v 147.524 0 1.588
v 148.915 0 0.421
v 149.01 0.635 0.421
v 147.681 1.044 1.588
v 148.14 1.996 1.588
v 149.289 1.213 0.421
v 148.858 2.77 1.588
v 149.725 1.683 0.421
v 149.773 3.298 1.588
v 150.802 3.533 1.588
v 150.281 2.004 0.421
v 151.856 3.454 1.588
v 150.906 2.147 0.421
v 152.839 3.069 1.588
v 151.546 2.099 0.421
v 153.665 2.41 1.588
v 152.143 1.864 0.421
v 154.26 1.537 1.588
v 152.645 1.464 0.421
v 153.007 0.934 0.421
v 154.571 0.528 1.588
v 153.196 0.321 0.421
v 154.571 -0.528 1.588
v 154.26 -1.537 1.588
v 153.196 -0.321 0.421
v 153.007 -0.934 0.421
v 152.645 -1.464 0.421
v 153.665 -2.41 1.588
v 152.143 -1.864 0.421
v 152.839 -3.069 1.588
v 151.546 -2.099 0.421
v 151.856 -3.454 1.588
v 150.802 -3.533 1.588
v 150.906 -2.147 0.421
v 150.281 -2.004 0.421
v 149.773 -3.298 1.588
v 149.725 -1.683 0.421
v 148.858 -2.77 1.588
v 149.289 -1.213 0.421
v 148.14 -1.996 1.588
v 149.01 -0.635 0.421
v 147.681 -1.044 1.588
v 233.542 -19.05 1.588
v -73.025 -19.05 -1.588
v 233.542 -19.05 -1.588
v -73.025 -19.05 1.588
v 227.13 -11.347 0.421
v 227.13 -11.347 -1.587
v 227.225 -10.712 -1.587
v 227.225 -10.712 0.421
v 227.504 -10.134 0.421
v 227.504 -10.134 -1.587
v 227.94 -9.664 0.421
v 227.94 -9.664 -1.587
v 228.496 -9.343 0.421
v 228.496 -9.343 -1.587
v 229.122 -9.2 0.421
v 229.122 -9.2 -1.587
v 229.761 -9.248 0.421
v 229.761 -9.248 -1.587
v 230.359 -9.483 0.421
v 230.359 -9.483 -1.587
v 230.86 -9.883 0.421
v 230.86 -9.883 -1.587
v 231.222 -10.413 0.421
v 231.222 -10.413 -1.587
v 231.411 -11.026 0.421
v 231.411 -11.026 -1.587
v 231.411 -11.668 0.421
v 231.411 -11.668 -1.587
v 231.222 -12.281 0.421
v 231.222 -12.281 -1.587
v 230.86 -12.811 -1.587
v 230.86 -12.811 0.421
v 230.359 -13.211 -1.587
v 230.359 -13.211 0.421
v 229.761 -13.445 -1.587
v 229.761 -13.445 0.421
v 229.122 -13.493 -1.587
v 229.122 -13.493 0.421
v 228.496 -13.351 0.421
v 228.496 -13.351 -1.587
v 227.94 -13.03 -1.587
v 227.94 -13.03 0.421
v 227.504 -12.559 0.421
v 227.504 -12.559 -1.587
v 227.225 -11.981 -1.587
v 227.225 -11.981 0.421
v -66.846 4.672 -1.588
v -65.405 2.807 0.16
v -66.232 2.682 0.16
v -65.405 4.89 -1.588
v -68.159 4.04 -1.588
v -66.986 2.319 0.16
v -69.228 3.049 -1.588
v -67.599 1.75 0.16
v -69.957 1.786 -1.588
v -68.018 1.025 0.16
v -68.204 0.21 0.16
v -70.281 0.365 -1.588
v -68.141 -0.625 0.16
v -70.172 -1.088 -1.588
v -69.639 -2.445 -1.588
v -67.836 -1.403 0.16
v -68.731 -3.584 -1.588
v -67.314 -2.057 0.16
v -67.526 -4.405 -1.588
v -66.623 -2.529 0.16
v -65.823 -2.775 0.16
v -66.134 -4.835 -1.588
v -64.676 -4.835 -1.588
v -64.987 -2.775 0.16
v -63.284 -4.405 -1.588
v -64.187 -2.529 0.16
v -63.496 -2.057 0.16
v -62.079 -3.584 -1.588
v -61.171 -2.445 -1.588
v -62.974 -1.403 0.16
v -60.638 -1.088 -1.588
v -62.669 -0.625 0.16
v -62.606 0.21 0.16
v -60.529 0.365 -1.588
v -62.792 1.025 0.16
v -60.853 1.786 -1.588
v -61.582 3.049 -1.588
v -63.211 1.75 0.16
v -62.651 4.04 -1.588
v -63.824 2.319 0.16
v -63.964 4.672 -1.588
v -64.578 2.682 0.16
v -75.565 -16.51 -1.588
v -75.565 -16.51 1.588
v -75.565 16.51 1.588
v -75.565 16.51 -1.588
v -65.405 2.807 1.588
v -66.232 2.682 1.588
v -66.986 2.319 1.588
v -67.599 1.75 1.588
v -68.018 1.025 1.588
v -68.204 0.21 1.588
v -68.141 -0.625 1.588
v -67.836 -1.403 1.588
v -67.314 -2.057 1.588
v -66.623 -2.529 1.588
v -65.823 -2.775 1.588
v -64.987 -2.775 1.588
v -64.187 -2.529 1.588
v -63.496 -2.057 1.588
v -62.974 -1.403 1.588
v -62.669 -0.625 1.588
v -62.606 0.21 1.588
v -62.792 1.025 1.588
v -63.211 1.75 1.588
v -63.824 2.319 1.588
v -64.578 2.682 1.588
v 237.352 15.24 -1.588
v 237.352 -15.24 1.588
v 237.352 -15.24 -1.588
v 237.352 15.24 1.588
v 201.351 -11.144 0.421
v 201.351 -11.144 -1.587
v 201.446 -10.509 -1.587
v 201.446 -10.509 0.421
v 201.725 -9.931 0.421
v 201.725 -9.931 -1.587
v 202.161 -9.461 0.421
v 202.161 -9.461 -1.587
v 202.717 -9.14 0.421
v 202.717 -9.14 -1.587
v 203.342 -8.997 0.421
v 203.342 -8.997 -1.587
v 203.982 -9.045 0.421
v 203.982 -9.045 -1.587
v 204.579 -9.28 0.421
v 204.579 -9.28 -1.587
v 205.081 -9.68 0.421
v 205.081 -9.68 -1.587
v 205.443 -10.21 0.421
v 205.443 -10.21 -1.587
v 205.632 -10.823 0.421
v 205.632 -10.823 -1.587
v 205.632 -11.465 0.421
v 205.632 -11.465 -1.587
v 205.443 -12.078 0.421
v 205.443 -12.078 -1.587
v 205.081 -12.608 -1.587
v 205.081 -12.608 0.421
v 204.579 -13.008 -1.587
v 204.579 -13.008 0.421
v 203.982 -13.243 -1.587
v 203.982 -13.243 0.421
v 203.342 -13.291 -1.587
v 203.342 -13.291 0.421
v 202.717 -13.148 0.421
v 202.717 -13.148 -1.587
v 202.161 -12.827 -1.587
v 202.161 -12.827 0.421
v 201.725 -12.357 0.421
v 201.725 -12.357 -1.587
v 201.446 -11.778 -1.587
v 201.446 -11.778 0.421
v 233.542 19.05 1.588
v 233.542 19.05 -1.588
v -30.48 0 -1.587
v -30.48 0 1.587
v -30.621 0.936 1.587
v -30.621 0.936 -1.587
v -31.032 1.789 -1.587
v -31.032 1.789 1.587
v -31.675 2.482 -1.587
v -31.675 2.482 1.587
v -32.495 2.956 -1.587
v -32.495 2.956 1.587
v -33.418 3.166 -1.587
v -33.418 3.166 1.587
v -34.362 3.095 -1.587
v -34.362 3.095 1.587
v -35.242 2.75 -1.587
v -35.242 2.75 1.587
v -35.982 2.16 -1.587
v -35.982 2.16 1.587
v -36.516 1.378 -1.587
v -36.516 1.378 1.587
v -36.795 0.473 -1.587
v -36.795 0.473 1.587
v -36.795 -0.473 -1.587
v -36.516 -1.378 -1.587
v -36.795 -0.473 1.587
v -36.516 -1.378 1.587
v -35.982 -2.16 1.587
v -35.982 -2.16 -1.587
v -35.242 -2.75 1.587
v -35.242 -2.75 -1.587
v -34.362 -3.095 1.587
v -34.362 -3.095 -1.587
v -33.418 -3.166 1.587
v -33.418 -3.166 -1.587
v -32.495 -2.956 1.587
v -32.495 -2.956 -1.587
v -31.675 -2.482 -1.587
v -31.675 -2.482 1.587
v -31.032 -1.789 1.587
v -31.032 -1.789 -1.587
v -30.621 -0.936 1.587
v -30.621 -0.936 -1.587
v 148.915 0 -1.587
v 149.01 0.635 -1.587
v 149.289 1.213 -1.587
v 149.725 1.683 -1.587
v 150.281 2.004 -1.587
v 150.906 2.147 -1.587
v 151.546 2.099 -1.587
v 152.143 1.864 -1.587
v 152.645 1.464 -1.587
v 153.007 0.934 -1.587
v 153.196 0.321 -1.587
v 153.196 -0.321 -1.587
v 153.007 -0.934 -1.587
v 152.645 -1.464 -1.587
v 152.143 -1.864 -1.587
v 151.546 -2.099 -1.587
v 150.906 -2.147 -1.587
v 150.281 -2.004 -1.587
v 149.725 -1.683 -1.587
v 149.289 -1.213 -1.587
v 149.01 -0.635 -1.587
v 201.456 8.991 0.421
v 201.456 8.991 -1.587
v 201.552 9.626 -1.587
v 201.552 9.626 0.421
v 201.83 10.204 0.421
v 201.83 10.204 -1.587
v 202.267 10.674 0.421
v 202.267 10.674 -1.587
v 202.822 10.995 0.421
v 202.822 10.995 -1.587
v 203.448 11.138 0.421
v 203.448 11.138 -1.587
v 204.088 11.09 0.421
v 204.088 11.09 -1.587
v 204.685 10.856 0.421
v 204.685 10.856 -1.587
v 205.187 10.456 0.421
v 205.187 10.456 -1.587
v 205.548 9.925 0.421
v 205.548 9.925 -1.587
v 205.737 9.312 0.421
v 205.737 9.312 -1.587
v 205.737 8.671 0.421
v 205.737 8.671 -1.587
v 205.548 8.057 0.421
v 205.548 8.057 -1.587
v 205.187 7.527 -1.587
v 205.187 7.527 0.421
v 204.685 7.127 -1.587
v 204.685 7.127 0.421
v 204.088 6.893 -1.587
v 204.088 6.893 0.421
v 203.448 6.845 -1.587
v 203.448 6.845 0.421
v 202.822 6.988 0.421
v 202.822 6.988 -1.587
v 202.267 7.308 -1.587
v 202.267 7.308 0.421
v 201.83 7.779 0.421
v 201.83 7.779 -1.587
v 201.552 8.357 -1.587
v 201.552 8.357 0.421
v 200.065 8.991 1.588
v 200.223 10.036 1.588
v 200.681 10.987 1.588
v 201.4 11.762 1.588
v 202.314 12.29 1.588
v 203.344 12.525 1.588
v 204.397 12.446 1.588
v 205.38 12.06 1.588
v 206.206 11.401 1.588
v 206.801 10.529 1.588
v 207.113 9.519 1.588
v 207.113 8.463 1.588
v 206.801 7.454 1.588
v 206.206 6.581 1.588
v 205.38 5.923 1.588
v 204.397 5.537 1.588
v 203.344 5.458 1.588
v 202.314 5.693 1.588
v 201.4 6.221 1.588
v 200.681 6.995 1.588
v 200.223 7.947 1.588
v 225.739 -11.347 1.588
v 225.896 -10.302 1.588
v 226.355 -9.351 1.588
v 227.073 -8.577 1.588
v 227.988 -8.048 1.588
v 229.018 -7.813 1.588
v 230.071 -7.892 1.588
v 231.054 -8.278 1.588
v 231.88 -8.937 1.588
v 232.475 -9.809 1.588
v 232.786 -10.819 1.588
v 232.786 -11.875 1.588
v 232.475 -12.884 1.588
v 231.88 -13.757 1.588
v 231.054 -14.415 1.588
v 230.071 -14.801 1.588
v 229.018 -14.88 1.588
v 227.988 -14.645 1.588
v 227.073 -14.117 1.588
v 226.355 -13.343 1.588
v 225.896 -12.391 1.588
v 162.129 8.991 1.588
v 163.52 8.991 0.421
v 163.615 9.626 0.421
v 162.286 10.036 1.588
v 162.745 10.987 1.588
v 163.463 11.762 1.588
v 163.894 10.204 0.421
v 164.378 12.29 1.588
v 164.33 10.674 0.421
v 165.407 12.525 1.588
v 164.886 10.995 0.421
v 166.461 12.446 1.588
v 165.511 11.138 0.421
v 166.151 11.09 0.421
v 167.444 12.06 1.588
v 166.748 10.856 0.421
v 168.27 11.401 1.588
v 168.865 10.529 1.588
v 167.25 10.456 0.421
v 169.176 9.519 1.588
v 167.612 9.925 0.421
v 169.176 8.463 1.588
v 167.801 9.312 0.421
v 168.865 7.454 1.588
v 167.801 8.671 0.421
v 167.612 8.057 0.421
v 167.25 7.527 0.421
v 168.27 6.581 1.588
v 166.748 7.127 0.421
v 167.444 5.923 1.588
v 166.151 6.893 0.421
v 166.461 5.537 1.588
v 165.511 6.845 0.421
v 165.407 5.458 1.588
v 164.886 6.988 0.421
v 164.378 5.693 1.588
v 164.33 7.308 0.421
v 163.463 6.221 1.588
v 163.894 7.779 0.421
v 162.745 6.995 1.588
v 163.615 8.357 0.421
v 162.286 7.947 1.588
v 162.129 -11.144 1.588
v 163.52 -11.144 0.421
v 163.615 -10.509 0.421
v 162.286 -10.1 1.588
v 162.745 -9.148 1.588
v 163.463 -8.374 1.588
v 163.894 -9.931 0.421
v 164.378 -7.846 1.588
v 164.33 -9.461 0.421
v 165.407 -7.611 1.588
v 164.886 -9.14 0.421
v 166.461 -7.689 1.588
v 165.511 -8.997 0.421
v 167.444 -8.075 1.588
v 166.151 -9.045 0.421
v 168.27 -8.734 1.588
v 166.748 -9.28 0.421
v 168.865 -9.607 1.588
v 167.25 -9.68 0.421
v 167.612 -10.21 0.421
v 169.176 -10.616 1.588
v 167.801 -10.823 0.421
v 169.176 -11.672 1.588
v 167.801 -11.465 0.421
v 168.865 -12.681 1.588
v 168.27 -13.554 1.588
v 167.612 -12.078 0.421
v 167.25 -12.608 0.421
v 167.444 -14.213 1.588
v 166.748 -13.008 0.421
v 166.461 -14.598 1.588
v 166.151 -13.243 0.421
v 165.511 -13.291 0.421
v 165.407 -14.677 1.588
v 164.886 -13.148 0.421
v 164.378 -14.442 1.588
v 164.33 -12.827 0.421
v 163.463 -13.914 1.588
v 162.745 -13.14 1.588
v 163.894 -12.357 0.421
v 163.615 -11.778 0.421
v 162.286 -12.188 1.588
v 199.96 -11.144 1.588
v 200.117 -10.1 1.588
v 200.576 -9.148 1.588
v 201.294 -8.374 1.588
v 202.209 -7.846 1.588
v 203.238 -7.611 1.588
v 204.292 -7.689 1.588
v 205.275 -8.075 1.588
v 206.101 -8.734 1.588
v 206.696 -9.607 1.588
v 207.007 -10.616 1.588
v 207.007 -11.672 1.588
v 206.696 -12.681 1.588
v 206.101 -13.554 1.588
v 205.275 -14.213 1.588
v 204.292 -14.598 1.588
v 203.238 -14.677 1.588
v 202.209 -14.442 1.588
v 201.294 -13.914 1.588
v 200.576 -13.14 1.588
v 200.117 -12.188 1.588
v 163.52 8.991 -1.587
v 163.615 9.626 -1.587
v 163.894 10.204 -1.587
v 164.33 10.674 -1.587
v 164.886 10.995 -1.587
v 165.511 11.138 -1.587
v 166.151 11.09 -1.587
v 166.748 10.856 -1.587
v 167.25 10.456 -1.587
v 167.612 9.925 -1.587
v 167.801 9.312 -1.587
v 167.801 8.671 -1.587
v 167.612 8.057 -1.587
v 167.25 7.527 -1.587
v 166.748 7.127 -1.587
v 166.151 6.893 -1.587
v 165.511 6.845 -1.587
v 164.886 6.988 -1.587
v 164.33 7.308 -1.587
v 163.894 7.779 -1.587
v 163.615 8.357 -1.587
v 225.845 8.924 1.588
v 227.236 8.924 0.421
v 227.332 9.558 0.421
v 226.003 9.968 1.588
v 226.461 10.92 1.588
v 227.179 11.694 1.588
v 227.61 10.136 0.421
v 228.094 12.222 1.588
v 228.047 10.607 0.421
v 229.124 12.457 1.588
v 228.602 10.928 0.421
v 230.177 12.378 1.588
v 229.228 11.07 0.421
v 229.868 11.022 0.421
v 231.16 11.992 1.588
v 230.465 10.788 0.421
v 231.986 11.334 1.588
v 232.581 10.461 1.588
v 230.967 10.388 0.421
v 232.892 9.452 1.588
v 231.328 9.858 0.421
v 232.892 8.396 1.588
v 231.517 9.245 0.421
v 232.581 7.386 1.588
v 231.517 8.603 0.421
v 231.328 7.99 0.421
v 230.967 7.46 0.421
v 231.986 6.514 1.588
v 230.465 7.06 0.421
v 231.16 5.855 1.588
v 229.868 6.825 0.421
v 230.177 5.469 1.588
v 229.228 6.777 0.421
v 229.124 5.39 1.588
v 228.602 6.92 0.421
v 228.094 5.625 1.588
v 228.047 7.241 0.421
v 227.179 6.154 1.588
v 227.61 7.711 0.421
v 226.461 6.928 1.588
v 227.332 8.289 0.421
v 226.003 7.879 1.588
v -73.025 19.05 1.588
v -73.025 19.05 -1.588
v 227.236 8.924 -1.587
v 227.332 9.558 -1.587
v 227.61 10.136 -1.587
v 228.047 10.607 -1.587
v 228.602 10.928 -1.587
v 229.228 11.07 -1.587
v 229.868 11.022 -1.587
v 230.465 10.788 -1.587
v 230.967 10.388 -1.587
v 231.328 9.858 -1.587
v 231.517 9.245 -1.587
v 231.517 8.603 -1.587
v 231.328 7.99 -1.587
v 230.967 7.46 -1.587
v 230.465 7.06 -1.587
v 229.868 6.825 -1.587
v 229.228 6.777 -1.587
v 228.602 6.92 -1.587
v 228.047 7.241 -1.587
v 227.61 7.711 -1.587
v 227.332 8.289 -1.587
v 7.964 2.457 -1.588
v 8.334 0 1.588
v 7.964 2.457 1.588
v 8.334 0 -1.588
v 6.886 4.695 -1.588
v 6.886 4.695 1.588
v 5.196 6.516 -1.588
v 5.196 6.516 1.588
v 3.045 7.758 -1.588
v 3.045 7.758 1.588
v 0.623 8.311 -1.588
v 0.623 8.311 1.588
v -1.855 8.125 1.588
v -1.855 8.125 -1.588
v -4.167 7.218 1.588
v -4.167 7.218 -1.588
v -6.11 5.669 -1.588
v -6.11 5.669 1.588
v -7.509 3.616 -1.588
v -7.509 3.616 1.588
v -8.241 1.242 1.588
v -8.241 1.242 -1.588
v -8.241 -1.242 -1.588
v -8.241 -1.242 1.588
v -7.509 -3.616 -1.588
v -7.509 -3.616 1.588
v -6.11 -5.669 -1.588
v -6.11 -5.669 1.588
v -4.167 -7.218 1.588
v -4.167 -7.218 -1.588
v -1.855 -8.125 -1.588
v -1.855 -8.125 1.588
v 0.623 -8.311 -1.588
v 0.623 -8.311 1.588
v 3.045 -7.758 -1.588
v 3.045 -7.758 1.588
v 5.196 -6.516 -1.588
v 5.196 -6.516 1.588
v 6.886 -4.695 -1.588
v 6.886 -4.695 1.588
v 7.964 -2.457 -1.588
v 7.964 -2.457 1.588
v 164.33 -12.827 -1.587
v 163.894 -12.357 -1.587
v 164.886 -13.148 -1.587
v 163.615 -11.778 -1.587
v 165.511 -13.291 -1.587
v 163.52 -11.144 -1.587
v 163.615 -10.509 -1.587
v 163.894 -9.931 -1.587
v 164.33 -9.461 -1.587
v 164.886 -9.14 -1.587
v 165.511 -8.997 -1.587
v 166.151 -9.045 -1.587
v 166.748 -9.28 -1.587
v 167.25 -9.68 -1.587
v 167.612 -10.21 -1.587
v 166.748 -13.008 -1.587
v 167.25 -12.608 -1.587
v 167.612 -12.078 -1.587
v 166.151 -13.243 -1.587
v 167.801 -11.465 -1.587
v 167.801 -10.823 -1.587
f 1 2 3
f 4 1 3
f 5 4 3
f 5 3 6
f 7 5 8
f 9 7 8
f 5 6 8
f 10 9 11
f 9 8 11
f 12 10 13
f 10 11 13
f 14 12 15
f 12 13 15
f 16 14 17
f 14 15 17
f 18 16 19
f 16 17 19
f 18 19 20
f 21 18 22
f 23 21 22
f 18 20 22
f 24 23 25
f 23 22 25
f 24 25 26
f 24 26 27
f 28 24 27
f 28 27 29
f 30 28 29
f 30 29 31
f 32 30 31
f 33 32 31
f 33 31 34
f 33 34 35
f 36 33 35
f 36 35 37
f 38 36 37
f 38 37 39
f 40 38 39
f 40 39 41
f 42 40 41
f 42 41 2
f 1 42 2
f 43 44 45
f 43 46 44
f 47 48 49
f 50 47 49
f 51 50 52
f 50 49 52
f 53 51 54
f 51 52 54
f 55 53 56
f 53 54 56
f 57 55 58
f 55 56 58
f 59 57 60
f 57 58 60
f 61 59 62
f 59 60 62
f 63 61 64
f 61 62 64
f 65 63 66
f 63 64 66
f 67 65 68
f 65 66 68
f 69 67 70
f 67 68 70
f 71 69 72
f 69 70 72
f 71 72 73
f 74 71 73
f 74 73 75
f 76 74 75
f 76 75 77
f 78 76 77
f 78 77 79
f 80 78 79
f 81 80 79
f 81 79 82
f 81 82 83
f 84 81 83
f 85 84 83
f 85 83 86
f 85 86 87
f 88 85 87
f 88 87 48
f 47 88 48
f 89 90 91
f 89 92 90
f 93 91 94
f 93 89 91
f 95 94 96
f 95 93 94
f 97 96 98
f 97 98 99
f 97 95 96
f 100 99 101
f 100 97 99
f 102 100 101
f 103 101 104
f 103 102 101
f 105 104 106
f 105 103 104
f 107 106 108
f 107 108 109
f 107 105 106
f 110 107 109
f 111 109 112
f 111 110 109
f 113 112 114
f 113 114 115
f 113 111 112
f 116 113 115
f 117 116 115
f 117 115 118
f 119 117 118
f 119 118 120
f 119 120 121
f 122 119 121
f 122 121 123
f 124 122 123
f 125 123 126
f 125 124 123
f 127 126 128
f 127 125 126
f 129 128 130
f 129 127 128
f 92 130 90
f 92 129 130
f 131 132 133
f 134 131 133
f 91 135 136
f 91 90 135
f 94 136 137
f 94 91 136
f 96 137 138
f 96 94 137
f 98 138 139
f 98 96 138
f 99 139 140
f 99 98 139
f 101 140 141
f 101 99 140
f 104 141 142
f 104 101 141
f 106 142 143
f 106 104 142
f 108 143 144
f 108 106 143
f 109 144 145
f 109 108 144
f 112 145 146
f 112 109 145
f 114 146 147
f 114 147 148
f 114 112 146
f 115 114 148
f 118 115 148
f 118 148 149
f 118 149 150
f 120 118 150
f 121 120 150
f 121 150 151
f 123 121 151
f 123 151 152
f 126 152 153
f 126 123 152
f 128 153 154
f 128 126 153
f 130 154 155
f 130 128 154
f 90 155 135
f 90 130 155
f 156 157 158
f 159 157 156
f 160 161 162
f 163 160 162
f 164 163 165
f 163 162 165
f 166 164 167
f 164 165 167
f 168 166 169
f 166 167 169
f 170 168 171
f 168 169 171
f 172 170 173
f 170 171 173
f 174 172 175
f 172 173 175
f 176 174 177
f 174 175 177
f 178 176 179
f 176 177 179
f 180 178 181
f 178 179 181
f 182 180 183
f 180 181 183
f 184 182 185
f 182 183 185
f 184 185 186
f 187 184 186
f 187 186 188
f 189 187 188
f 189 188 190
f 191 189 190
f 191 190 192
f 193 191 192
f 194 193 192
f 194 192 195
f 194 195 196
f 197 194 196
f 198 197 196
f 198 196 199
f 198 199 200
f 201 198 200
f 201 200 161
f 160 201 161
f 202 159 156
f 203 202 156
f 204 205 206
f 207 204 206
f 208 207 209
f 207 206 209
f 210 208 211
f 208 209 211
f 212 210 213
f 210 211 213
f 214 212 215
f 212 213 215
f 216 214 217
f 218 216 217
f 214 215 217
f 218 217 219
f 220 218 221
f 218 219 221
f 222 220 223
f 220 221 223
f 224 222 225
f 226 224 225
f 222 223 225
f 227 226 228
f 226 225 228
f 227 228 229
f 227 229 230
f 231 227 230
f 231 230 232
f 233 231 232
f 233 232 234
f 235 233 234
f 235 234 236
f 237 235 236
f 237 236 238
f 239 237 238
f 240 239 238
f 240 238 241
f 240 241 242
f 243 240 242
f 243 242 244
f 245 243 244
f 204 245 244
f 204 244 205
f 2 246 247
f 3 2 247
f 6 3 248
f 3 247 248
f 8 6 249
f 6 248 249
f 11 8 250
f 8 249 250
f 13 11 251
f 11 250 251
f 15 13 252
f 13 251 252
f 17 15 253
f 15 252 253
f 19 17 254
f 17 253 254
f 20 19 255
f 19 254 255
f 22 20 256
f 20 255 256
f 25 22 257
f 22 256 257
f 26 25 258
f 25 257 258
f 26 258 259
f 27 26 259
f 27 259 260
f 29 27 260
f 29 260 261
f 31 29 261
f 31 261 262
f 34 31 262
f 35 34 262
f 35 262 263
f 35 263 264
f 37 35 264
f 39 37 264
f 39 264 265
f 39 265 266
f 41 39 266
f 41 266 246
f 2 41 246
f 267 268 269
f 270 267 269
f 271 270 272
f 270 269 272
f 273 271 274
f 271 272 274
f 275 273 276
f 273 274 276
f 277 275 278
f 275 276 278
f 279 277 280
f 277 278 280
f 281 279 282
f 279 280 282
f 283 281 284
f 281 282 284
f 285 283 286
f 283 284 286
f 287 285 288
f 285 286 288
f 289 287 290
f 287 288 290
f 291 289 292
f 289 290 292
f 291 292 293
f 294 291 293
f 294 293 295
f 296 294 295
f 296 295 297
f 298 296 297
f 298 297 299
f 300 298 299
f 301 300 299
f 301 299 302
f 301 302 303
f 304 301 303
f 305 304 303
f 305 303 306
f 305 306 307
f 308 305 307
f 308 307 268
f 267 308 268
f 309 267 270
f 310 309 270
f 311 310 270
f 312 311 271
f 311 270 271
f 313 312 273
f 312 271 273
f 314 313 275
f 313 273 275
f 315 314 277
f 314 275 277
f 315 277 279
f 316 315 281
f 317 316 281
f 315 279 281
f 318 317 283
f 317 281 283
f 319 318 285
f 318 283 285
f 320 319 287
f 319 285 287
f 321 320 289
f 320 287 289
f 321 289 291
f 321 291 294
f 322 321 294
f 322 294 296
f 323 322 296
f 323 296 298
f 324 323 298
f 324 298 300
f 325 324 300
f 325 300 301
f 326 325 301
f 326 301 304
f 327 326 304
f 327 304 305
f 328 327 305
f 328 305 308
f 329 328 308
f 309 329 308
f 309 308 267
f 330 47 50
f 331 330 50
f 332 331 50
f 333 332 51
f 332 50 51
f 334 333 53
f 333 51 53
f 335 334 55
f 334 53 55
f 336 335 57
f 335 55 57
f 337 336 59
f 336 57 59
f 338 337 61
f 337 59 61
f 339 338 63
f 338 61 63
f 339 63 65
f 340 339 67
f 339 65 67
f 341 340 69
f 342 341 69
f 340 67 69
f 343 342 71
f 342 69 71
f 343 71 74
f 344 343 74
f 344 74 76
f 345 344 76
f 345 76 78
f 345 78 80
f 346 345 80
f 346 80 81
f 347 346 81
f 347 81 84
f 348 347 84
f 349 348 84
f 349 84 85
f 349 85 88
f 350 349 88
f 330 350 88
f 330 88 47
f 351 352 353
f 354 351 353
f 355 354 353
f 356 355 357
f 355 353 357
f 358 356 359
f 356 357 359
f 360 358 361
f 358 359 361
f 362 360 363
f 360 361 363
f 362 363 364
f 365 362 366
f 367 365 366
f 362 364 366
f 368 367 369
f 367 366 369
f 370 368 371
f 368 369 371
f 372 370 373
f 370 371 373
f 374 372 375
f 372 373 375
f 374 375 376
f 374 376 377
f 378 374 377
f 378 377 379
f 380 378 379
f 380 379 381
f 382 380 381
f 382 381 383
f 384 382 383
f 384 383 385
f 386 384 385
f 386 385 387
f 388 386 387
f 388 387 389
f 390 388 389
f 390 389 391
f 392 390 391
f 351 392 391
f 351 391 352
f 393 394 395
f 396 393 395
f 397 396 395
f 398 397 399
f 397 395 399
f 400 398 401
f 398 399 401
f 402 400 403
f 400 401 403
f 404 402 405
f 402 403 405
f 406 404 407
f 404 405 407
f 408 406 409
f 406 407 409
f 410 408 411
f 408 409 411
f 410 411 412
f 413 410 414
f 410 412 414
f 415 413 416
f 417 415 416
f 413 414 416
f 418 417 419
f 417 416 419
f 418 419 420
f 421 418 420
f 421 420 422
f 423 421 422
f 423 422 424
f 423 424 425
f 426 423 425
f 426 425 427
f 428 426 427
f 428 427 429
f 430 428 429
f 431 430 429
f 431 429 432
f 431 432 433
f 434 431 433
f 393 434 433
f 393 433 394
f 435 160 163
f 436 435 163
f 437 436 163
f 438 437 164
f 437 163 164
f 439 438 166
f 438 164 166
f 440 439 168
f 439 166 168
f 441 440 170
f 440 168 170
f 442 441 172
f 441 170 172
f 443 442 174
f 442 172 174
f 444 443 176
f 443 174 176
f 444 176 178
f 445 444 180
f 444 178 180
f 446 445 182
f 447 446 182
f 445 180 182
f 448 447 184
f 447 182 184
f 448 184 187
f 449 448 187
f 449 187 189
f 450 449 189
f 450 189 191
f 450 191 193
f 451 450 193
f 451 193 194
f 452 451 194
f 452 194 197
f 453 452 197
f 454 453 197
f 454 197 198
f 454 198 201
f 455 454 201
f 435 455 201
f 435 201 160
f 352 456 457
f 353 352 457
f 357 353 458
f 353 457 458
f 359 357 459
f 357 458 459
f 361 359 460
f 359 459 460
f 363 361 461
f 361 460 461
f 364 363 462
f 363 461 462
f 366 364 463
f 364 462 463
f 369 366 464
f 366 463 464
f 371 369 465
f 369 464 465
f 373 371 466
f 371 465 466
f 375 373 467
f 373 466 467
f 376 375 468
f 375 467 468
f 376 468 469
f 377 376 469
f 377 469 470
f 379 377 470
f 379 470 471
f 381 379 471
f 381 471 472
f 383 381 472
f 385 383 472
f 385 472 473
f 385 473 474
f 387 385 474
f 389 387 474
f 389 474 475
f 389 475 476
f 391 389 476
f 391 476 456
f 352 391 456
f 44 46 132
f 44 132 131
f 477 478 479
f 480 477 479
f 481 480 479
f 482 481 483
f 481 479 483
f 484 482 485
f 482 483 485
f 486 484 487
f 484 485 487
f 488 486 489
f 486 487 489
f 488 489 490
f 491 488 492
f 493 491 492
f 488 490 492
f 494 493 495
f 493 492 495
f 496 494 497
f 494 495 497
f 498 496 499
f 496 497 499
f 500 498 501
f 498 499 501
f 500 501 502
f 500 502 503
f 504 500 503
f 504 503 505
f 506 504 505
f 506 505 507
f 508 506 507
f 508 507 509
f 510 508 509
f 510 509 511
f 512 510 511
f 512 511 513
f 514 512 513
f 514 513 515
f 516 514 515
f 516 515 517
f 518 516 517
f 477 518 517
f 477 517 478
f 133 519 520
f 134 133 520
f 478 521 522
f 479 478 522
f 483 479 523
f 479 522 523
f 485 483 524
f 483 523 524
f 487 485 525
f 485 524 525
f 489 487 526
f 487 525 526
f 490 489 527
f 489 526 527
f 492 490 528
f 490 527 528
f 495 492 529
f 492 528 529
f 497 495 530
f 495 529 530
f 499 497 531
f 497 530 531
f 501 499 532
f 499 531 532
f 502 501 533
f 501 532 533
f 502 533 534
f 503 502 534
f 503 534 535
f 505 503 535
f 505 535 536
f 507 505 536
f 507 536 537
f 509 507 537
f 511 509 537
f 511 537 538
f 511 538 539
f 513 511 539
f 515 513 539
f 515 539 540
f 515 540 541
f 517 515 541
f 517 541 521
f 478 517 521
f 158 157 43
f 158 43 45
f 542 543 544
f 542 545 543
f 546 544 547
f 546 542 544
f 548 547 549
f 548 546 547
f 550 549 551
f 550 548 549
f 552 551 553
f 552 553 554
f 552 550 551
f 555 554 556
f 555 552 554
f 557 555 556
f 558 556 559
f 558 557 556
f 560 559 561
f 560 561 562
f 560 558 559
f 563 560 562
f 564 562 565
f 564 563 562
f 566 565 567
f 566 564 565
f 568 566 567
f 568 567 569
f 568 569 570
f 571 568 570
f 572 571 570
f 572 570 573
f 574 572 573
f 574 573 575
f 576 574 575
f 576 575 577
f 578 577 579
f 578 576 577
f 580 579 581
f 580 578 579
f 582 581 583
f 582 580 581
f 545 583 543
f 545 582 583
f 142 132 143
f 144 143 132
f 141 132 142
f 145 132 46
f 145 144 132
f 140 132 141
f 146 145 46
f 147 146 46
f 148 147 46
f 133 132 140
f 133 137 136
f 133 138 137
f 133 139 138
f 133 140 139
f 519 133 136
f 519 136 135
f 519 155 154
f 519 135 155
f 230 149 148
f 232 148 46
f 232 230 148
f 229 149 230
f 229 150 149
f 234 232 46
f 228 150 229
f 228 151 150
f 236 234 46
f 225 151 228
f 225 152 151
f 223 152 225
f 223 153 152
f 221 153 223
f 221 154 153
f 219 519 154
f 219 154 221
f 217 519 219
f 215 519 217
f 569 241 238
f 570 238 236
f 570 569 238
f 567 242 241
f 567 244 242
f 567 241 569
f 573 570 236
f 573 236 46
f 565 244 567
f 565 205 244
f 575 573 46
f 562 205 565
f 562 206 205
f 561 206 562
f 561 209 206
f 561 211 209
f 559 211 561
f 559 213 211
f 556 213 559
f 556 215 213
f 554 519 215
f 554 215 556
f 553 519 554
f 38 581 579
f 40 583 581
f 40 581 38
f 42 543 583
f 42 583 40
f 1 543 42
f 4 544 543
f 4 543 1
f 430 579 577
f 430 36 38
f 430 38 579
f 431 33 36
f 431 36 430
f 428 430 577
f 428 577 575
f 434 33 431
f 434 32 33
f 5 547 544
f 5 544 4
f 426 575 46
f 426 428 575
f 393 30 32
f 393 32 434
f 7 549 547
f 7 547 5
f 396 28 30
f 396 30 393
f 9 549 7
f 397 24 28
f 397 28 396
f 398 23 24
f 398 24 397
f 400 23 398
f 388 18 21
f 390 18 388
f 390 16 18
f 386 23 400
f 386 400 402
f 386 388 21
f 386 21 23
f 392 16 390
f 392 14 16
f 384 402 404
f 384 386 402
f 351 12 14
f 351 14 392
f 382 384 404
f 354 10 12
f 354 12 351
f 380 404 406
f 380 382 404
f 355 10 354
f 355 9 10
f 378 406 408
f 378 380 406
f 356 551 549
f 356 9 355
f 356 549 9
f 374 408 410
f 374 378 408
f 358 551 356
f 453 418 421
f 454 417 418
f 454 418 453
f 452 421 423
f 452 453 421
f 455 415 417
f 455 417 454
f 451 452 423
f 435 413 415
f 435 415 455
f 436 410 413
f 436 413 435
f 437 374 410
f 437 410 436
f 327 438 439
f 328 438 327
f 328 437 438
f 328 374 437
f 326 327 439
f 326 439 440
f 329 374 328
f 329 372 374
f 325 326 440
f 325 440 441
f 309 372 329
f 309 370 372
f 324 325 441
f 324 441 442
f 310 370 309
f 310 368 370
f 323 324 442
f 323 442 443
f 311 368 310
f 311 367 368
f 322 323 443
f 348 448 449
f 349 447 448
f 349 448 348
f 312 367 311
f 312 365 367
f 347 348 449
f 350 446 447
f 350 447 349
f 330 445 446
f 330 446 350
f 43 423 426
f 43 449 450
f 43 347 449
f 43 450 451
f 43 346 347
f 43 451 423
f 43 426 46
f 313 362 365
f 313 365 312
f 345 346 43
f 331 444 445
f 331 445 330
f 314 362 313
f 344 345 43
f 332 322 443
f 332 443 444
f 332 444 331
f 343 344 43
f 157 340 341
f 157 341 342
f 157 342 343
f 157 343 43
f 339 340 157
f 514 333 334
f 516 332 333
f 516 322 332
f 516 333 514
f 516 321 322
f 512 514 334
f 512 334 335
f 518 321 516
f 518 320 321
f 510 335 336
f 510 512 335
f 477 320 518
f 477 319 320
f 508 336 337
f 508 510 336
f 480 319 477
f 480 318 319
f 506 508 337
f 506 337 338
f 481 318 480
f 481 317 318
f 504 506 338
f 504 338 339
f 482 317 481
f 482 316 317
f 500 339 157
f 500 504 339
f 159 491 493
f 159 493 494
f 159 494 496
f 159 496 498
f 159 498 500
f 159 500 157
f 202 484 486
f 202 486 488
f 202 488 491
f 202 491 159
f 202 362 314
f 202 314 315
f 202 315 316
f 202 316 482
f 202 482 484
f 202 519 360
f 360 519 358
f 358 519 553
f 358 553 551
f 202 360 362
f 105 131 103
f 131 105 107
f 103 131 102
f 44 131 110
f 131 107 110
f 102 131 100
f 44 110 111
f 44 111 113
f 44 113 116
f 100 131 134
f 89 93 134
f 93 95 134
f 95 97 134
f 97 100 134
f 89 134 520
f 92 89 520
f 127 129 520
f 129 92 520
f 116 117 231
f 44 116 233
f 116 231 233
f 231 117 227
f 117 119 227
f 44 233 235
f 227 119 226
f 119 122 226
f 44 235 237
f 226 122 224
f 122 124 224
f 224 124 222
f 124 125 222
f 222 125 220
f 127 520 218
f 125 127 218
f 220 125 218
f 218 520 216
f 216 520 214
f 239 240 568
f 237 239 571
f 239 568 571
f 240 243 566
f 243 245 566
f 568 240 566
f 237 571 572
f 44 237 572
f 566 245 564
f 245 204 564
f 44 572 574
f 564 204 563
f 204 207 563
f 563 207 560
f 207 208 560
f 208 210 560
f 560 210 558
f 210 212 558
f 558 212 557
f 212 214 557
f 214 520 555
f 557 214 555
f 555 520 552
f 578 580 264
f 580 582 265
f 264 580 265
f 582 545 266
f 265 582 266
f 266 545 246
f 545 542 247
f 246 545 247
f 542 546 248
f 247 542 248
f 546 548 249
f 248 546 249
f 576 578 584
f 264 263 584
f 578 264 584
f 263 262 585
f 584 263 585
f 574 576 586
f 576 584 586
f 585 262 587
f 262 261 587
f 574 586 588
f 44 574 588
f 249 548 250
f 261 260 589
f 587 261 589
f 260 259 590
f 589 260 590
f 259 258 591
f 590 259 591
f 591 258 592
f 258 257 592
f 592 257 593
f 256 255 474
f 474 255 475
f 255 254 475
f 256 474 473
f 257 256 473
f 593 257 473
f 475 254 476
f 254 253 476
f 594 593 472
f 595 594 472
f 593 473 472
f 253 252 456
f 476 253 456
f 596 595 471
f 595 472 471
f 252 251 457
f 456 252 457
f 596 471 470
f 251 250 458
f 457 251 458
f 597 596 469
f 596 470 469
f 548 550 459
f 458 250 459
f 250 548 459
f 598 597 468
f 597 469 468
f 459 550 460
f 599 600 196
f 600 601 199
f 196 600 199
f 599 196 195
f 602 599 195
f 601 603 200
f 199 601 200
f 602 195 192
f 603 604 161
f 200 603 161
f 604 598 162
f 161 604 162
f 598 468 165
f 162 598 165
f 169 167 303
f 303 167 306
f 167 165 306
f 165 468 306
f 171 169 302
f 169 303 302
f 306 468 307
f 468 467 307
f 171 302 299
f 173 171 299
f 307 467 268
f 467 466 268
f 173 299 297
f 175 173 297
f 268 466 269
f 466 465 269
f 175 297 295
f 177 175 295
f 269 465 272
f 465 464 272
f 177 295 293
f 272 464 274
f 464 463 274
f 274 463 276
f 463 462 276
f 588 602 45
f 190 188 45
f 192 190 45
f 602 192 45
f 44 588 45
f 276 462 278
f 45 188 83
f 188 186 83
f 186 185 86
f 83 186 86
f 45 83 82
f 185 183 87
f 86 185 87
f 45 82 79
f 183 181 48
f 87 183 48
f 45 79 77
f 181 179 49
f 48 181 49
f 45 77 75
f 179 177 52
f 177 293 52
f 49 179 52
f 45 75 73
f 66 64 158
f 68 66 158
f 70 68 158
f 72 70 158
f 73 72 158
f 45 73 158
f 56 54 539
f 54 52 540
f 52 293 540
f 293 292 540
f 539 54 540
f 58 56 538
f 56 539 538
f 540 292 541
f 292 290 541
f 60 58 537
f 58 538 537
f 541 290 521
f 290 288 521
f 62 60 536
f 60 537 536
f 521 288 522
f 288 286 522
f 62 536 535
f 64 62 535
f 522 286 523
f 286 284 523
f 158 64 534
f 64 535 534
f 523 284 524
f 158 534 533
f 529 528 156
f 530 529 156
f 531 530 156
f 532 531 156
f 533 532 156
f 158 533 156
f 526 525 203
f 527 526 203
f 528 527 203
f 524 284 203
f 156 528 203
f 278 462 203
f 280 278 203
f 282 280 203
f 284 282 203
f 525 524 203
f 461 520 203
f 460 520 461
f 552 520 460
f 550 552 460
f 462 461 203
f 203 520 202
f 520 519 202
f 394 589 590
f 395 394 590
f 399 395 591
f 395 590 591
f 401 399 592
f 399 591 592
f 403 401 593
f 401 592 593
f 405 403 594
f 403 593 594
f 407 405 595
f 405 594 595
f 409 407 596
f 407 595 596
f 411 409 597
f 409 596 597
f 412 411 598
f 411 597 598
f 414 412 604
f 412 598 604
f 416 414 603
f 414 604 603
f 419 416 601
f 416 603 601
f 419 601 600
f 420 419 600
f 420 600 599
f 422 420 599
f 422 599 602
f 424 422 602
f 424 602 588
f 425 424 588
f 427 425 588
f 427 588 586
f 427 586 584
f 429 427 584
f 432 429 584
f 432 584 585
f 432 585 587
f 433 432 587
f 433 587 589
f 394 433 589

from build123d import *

# Parameters (mm, degrees)
SKETCH1_R                                         = 8.334375
BOSS_EXTRUDE1_DEPTH                               = 1.5875
F_6_CLEARANCE_HOLE3_D                             = 4.3053
CUT_EXTRUDE1_DEPTH                                = 4.175
CHAMFER1_SIZE                                     = 3.81
CSK_FOR_6_FLAT_HEAD_MACHINE_SCREW_100_D           = 4.3053
CSK_FOR_6_FLAT_HEAD_MACHINE_SCREW_100_CSINK_D     = 7.0866
CSK_FOR_6_FLAT_HEAD_MACHINE_SCREW_100_CSINK_ANGLE = 100
SKETCH14_W                                        = 50.8
SKETCH14_H                                        = 38.1
BOSS_EXTRUDE2_DEPTH                               = 3.175
CHAMFER2_SIZE                                     = 2.54
F_1_4_0_25_DIAMETER_HOLE1_D                       = 6.35


with BuildPart() as part:
    # Sketch1 → Boss-Extrude1 (new body, symmetric)
    with BuildSketch(Plane.XY):
        Polygon((0, 19.05), (-28.575, 19.05), (-28.575, -19.05), (0, -19.05), (247.281942035, -19.05), (254, 19.05), align=None)
        Circle(SKETCH1_R, mode=Mode.SUBTRACT)
    extrude(amount=BOSS_EXTRUDE1_DEPTH, both=True)

    # #6 Clearance Hole3 (through all)
    with Locations(Plane.XY.offset(1.5875)):
        with Locations((229.388701471, 8.923791784), (229.282371239, -11.346798968), (203.503161764, -11.143926969), (203.608782335, 8.991375351), (165.672159691, 8.991375351), (165.672159691, -11.143926969), (151.067159691, 0)):
            Hole(F_6_CLEARANCE_HOLE3_D / 2)

    # Sketch9 → Cut-Extrude1 (cut, through all)
    with BuildSketch(Plane.XY.offset(1.5875)):
        Polygon((254, 19.05), (247.281942035, -19.05), (237.352085197, -19.05), (237.352085197, 19.05), align=None)
    extrude(amount=-CUT_EXTRUDE1_DEPTH, mode=Mode.SUBTRACT)

    # Chamfer1
    chamfer1_edges = [part.edges().sort_by_distance(p)[0] for p in [
        (-28.575, -19.05, 0),
        (-28.575, 19.05, 0),
        (237.352085197, 19.05, 0),
        (237.352085197, -19.05, 0),
    ]]
    chamfer(chamfer1_edges, length=CHAMFER1_SIZE)

    # CSK for #6 Flat Head Machine Screw (100)2 (through all)
    with Locations(Plane.XY.offset(1.5875)):
        with Locations((203.608782335, 8.991375351), (203.503161764, -11.143926969), (229.282371239, -11.346798968), (229.388701471, 8.923791784), (165.672159691, 8.991375351), (165.672159691, -11.143926969), (151.067159691, 0)):
            CounterSinkHole(CSK_FOR_6_FLAT_HEAD_MACHINE_SCREW_100_D / 2, CSK_FOR_6_FLAT_HEAD_MACHINE_SCREW_100_CSINK_D / 2, counter_sink_angle=CSK_FOR_6_FLAT_HEAD_MACHINE_SCREW_100_CSINK_ANGLE)

    # Sketch14 → Boss-Extrude2 (add, through all)
    with BuildSketch(Plane.XY.offset(1.5875)):
        with Locations((-50.165, 0)):
            Rectangle(SKETCH14_W, SKETCH14_H)
    extrude(amount=-BOSS_EXTRUDE2_DEPTH)

    # Chamfer2
    chamfer2_edges = [part.edges().sort_by_distance(p)[0] for p in [
        (-75.565, -19.05, 0),
        (-75.565, 19.05, 0),
    ]]
    chamfer(chamfer2_edges, length=CHAMFER2_SIZE)

    # Sketch16 → CSK for #10 Flat Head Machine Screw (100)1 (revolve, cut)
    with BuildSketch(Plane(origin=(-65.405, 0, -1.5875), x_dir=(0, 1, 0), z_dir=(1, 0, 0))):
        Polygon((0, 0), (0, 3.175), (2.8067, 3.175), (2.8067, 1.747676712), (4.8895, 0), align=None)
    revolve(axis=Axis((-65.405, 0, -7.9375), (0, 0, 1)), mode=Mode.SUBTRACT)

    # 1/4 (0.25) Diameter Hole1 (through all)
    with Locations(Plane(origin=(0, 0, -1.5875), x_dir=(-1, 0, 0), z_dir=(0, 0, -1))):
        with Locations((33.655, 0)):
            Hole(F_1_4_0_25_DIAMETER_HOLE1_D / 2)


solid = part.part
